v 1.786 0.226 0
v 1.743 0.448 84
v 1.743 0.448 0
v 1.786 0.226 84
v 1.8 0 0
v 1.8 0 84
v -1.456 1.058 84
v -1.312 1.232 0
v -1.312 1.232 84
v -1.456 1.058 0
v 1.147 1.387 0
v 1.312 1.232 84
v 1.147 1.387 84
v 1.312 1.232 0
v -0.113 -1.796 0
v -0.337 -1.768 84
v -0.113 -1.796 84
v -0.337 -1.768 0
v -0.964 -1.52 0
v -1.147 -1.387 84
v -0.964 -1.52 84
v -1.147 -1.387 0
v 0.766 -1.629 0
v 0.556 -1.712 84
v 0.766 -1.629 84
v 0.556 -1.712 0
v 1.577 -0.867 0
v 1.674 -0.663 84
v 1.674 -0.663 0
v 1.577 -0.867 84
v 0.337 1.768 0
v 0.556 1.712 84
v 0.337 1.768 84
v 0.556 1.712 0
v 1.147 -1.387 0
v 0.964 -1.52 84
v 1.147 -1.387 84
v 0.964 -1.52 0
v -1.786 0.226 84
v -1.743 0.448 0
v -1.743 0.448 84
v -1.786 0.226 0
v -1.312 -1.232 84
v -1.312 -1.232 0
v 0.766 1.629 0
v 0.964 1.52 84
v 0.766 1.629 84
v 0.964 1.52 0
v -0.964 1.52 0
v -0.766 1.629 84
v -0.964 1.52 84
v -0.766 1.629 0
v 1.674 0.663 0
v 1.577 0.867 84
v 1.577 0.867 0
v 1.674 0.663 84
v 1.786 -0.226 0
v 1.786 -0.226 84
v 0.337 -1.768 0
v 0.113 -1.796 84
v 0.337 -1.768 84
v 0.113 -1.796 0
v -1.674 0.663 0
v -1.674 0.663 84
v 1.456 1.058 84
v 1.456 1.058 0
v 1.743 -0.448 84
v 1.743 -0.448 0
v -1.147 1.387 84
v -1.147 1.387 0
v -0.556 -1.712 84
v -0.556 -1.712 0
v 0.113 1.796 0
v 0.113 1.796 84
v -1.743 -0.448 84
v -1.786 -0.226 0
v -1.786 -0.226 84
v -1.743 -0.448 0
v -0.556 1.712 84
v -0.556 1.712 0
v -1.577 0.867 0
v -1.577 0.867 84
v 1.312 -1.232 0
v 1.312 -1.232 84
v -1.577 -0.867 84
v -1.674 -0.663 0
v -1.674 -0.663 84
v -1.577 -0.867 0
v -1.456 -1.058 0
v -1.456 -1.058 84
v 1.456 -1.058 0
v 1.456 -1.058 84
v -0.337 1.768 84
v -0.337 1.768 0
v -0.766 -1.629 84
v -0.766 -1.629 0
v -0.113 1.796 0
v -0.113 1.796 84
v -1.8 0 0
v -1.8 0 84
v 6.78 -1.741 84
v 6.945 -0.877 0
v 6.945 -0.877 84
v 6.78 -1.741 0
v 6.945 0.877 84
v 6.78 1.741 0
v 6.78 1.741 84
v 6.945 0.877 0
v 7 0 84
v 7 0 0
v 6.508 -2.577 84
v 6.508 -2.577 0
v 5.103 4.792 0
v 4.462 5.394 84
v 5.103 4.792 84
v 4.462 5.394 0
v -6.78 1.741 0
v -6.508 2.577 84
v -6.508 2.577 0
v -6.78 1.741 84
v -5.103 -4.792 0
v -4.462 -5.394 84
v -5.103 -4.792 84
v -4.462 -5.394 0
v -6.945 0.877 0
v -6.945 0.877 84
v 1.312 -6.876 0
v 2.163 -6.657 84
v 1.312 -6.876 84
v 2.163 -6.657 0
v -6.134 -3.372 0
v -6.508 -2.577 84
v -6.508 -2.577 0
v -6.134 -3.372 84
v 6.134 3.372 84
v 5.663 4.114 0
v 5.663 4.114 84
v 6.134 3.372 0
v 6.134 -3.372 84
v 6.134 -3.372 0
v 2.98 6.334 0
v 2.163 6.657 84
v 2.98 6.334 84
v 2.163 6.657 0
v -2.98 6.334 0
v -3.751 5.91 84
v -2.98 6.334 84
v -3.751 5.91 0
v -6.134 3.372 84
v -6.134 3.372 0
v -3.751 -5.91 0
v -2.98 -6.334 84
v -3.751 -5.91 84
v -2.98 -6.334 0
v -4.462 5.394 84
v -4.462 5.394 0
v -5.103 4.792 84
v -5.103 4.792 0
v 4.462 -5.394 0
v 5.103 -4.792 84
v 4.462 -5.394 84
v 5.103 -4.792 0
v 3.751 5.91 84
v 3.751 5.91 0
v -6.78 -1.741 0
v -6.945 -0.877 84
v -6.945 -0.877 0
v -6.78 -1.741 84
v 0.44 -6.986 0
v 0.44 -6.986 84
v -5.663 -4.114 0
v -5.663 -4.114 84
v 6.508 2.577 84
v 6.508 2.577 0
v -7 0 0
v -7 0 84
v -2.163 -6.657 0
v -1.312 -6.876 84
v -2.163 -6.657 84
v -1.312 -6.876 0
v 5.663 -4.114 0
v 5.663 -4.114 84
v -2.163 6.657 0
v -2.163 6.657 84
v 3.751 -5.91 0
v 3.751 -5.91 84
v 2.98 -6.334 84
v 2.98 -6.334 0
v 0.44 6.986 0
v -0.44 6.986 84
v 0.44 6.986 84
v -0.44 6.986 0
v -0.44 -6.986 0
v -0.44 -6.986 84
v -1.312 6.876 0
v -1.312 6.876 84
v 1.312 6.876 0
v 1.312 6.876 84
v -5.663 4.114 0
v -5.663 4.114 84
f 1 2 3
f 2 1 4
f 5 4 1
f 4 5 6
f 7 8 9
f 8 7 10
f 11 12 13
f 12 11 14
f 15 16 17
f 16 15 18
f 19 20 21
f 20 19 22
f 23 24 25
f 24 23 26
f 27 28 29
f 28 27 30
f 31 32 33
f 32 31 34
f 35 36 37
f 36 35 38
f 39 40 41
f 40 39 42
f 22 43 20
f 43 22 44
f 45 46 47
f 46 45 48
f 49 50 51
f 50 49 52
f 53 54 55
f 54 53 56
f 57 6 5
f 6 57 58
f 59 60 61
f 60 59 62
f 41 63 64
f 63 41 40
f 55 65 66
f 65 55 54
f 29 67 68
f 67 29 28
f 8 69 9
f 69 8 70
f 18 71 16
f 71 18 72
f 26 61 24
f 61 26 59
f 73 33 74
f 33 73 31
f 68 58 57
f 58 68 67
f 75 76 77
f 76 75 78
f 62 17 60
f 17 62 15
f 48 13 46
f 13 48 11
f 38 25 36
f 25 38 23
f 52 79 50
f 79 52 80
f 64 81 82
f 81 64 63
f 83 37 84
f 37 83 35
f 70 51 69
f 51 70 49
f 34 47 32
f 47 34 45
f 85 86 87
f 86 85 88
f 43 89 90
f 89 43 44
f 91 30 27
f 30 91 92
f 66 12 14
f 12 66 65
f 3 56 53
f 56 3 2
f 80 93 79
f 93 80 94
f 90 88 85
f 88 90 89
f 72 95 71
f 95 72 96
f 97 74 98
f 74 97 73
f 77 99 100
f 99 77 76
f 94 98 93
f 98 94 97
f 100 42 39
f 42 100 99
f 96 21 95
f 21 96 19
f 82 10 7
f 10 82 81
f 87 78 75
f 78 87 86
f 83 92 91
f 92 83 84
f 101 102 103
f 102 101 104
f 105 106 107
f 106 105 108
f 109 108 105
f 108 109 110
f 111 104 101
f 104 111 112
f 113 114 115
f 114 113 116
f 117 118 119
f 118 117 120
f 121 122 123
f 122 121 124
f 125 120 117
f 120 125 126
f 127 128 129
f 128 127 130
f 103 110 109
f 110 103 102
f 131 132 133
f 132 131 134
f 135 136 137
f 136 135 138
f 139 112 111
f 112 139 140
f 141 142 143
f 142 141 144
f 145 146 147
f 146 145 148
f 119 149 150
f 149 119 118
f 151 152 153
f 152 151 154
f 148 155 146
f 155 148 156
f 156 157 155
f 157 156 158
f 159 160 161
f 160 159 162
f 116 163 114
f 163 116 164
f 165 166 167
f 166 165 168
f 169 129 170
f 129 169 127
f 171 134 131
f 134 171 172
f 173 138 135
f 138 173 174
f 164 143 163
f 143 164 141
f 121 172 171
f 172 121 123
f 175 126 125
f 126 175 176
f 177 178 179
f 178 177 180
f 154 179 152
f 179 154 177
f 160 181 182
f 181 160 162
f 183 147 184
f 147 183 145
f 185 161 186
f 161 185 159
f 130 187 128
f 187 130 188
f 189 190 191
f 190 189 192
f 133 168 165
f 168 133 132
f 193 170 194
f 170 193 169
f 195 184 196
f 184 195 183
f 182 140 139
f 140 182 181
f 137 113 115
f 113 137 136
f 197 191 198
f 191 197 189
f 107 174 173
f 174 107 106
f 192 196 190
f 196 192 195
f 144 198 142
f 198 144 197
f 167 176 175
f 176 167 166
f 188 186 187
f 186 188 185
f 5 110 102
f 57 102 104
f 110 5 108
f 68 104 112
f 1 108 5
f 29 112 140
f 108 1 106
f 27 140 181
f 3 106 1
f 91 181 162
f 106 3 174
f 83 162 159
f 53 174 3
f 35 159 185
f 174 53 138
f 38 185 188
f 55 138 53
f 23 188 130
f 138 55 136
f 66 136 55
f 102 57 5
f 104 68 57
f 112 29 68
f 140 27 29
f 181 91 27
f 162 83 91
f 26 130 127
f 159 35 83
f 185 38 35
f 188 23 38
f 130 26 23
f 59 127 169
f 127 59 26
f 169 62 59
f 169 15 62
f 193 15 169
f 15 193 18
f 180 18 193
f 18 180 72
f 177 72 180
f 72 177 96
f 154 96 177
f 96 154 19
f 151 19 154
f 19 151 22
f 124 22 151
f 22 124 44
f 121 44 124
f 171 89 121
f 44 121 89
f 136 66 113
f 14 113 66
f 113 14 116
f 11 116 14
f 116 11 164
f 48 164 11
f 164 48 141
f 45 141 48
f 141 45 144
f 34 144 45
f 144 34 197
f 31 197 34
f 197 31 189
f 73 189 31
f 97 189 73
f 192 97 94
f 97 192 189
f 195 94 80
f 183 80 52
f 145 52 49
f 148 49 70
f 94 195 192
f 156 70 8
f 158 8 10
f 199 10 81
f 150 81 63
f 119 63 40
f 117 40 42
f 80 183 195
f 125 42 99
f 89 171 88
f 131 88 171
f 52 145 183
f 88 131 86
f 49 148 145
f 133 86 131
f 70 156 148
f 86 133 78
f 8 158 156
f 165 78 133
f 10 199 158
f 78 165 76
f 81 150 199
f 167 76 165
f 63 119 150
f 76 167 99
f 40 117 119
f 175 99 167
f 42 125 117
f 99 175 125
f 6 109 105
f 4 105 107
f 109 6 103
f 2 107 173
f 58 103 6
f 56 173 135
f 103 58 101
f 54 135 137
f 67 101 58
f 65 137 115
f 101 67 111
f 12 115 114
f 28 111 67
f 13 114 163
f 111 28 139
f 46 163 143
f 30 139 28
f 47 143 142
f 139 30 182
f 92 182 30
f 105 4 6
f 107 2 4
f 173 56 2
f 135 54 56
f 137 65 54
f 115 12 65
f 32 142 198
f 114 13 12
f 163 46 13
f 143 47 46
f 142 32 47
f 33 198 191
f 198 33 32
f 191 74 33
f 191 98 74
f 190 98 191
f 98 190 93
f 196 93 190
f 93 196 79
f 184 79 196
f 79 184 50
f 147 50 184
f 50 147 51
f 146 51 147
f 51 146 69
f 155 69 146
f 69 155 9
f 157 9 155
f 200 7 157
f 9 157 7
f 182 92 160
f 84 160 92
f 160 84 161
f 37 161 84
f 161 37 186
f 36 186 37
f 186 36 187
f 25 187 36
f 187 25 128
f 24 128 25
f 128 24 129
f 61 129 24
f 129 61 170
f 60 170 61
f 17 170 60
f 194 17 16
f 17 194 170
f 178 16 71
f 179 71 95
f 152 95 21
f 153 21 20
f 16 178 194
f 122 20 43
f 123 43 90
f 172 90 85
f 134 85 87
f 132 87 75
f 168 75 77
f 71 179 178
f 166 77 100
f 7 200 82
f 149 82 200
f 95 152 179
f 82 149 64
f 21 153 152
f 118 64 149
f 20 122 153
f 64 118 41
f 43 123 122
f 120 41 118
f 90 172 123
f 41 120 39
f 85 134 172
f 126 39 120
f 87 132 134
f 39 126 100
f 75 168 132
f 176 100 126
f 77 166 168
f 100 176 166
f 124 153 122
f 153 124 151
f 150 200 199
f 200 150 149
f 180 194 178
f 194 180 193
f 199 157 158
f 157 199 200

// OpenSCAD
$fn = 50;


difference() {
	union() {
		cylinder(h = 84, r = 7.0000000000);
	}
	union() {
		translate(v = [0, 0, -100]) {
			cylinder(h = 200, r = 1.8000000000);
		}
		translate(v = [0, 0, -100]) {
			cylinder(h = 200, r = 1.8000000000);
		}
	}
}
